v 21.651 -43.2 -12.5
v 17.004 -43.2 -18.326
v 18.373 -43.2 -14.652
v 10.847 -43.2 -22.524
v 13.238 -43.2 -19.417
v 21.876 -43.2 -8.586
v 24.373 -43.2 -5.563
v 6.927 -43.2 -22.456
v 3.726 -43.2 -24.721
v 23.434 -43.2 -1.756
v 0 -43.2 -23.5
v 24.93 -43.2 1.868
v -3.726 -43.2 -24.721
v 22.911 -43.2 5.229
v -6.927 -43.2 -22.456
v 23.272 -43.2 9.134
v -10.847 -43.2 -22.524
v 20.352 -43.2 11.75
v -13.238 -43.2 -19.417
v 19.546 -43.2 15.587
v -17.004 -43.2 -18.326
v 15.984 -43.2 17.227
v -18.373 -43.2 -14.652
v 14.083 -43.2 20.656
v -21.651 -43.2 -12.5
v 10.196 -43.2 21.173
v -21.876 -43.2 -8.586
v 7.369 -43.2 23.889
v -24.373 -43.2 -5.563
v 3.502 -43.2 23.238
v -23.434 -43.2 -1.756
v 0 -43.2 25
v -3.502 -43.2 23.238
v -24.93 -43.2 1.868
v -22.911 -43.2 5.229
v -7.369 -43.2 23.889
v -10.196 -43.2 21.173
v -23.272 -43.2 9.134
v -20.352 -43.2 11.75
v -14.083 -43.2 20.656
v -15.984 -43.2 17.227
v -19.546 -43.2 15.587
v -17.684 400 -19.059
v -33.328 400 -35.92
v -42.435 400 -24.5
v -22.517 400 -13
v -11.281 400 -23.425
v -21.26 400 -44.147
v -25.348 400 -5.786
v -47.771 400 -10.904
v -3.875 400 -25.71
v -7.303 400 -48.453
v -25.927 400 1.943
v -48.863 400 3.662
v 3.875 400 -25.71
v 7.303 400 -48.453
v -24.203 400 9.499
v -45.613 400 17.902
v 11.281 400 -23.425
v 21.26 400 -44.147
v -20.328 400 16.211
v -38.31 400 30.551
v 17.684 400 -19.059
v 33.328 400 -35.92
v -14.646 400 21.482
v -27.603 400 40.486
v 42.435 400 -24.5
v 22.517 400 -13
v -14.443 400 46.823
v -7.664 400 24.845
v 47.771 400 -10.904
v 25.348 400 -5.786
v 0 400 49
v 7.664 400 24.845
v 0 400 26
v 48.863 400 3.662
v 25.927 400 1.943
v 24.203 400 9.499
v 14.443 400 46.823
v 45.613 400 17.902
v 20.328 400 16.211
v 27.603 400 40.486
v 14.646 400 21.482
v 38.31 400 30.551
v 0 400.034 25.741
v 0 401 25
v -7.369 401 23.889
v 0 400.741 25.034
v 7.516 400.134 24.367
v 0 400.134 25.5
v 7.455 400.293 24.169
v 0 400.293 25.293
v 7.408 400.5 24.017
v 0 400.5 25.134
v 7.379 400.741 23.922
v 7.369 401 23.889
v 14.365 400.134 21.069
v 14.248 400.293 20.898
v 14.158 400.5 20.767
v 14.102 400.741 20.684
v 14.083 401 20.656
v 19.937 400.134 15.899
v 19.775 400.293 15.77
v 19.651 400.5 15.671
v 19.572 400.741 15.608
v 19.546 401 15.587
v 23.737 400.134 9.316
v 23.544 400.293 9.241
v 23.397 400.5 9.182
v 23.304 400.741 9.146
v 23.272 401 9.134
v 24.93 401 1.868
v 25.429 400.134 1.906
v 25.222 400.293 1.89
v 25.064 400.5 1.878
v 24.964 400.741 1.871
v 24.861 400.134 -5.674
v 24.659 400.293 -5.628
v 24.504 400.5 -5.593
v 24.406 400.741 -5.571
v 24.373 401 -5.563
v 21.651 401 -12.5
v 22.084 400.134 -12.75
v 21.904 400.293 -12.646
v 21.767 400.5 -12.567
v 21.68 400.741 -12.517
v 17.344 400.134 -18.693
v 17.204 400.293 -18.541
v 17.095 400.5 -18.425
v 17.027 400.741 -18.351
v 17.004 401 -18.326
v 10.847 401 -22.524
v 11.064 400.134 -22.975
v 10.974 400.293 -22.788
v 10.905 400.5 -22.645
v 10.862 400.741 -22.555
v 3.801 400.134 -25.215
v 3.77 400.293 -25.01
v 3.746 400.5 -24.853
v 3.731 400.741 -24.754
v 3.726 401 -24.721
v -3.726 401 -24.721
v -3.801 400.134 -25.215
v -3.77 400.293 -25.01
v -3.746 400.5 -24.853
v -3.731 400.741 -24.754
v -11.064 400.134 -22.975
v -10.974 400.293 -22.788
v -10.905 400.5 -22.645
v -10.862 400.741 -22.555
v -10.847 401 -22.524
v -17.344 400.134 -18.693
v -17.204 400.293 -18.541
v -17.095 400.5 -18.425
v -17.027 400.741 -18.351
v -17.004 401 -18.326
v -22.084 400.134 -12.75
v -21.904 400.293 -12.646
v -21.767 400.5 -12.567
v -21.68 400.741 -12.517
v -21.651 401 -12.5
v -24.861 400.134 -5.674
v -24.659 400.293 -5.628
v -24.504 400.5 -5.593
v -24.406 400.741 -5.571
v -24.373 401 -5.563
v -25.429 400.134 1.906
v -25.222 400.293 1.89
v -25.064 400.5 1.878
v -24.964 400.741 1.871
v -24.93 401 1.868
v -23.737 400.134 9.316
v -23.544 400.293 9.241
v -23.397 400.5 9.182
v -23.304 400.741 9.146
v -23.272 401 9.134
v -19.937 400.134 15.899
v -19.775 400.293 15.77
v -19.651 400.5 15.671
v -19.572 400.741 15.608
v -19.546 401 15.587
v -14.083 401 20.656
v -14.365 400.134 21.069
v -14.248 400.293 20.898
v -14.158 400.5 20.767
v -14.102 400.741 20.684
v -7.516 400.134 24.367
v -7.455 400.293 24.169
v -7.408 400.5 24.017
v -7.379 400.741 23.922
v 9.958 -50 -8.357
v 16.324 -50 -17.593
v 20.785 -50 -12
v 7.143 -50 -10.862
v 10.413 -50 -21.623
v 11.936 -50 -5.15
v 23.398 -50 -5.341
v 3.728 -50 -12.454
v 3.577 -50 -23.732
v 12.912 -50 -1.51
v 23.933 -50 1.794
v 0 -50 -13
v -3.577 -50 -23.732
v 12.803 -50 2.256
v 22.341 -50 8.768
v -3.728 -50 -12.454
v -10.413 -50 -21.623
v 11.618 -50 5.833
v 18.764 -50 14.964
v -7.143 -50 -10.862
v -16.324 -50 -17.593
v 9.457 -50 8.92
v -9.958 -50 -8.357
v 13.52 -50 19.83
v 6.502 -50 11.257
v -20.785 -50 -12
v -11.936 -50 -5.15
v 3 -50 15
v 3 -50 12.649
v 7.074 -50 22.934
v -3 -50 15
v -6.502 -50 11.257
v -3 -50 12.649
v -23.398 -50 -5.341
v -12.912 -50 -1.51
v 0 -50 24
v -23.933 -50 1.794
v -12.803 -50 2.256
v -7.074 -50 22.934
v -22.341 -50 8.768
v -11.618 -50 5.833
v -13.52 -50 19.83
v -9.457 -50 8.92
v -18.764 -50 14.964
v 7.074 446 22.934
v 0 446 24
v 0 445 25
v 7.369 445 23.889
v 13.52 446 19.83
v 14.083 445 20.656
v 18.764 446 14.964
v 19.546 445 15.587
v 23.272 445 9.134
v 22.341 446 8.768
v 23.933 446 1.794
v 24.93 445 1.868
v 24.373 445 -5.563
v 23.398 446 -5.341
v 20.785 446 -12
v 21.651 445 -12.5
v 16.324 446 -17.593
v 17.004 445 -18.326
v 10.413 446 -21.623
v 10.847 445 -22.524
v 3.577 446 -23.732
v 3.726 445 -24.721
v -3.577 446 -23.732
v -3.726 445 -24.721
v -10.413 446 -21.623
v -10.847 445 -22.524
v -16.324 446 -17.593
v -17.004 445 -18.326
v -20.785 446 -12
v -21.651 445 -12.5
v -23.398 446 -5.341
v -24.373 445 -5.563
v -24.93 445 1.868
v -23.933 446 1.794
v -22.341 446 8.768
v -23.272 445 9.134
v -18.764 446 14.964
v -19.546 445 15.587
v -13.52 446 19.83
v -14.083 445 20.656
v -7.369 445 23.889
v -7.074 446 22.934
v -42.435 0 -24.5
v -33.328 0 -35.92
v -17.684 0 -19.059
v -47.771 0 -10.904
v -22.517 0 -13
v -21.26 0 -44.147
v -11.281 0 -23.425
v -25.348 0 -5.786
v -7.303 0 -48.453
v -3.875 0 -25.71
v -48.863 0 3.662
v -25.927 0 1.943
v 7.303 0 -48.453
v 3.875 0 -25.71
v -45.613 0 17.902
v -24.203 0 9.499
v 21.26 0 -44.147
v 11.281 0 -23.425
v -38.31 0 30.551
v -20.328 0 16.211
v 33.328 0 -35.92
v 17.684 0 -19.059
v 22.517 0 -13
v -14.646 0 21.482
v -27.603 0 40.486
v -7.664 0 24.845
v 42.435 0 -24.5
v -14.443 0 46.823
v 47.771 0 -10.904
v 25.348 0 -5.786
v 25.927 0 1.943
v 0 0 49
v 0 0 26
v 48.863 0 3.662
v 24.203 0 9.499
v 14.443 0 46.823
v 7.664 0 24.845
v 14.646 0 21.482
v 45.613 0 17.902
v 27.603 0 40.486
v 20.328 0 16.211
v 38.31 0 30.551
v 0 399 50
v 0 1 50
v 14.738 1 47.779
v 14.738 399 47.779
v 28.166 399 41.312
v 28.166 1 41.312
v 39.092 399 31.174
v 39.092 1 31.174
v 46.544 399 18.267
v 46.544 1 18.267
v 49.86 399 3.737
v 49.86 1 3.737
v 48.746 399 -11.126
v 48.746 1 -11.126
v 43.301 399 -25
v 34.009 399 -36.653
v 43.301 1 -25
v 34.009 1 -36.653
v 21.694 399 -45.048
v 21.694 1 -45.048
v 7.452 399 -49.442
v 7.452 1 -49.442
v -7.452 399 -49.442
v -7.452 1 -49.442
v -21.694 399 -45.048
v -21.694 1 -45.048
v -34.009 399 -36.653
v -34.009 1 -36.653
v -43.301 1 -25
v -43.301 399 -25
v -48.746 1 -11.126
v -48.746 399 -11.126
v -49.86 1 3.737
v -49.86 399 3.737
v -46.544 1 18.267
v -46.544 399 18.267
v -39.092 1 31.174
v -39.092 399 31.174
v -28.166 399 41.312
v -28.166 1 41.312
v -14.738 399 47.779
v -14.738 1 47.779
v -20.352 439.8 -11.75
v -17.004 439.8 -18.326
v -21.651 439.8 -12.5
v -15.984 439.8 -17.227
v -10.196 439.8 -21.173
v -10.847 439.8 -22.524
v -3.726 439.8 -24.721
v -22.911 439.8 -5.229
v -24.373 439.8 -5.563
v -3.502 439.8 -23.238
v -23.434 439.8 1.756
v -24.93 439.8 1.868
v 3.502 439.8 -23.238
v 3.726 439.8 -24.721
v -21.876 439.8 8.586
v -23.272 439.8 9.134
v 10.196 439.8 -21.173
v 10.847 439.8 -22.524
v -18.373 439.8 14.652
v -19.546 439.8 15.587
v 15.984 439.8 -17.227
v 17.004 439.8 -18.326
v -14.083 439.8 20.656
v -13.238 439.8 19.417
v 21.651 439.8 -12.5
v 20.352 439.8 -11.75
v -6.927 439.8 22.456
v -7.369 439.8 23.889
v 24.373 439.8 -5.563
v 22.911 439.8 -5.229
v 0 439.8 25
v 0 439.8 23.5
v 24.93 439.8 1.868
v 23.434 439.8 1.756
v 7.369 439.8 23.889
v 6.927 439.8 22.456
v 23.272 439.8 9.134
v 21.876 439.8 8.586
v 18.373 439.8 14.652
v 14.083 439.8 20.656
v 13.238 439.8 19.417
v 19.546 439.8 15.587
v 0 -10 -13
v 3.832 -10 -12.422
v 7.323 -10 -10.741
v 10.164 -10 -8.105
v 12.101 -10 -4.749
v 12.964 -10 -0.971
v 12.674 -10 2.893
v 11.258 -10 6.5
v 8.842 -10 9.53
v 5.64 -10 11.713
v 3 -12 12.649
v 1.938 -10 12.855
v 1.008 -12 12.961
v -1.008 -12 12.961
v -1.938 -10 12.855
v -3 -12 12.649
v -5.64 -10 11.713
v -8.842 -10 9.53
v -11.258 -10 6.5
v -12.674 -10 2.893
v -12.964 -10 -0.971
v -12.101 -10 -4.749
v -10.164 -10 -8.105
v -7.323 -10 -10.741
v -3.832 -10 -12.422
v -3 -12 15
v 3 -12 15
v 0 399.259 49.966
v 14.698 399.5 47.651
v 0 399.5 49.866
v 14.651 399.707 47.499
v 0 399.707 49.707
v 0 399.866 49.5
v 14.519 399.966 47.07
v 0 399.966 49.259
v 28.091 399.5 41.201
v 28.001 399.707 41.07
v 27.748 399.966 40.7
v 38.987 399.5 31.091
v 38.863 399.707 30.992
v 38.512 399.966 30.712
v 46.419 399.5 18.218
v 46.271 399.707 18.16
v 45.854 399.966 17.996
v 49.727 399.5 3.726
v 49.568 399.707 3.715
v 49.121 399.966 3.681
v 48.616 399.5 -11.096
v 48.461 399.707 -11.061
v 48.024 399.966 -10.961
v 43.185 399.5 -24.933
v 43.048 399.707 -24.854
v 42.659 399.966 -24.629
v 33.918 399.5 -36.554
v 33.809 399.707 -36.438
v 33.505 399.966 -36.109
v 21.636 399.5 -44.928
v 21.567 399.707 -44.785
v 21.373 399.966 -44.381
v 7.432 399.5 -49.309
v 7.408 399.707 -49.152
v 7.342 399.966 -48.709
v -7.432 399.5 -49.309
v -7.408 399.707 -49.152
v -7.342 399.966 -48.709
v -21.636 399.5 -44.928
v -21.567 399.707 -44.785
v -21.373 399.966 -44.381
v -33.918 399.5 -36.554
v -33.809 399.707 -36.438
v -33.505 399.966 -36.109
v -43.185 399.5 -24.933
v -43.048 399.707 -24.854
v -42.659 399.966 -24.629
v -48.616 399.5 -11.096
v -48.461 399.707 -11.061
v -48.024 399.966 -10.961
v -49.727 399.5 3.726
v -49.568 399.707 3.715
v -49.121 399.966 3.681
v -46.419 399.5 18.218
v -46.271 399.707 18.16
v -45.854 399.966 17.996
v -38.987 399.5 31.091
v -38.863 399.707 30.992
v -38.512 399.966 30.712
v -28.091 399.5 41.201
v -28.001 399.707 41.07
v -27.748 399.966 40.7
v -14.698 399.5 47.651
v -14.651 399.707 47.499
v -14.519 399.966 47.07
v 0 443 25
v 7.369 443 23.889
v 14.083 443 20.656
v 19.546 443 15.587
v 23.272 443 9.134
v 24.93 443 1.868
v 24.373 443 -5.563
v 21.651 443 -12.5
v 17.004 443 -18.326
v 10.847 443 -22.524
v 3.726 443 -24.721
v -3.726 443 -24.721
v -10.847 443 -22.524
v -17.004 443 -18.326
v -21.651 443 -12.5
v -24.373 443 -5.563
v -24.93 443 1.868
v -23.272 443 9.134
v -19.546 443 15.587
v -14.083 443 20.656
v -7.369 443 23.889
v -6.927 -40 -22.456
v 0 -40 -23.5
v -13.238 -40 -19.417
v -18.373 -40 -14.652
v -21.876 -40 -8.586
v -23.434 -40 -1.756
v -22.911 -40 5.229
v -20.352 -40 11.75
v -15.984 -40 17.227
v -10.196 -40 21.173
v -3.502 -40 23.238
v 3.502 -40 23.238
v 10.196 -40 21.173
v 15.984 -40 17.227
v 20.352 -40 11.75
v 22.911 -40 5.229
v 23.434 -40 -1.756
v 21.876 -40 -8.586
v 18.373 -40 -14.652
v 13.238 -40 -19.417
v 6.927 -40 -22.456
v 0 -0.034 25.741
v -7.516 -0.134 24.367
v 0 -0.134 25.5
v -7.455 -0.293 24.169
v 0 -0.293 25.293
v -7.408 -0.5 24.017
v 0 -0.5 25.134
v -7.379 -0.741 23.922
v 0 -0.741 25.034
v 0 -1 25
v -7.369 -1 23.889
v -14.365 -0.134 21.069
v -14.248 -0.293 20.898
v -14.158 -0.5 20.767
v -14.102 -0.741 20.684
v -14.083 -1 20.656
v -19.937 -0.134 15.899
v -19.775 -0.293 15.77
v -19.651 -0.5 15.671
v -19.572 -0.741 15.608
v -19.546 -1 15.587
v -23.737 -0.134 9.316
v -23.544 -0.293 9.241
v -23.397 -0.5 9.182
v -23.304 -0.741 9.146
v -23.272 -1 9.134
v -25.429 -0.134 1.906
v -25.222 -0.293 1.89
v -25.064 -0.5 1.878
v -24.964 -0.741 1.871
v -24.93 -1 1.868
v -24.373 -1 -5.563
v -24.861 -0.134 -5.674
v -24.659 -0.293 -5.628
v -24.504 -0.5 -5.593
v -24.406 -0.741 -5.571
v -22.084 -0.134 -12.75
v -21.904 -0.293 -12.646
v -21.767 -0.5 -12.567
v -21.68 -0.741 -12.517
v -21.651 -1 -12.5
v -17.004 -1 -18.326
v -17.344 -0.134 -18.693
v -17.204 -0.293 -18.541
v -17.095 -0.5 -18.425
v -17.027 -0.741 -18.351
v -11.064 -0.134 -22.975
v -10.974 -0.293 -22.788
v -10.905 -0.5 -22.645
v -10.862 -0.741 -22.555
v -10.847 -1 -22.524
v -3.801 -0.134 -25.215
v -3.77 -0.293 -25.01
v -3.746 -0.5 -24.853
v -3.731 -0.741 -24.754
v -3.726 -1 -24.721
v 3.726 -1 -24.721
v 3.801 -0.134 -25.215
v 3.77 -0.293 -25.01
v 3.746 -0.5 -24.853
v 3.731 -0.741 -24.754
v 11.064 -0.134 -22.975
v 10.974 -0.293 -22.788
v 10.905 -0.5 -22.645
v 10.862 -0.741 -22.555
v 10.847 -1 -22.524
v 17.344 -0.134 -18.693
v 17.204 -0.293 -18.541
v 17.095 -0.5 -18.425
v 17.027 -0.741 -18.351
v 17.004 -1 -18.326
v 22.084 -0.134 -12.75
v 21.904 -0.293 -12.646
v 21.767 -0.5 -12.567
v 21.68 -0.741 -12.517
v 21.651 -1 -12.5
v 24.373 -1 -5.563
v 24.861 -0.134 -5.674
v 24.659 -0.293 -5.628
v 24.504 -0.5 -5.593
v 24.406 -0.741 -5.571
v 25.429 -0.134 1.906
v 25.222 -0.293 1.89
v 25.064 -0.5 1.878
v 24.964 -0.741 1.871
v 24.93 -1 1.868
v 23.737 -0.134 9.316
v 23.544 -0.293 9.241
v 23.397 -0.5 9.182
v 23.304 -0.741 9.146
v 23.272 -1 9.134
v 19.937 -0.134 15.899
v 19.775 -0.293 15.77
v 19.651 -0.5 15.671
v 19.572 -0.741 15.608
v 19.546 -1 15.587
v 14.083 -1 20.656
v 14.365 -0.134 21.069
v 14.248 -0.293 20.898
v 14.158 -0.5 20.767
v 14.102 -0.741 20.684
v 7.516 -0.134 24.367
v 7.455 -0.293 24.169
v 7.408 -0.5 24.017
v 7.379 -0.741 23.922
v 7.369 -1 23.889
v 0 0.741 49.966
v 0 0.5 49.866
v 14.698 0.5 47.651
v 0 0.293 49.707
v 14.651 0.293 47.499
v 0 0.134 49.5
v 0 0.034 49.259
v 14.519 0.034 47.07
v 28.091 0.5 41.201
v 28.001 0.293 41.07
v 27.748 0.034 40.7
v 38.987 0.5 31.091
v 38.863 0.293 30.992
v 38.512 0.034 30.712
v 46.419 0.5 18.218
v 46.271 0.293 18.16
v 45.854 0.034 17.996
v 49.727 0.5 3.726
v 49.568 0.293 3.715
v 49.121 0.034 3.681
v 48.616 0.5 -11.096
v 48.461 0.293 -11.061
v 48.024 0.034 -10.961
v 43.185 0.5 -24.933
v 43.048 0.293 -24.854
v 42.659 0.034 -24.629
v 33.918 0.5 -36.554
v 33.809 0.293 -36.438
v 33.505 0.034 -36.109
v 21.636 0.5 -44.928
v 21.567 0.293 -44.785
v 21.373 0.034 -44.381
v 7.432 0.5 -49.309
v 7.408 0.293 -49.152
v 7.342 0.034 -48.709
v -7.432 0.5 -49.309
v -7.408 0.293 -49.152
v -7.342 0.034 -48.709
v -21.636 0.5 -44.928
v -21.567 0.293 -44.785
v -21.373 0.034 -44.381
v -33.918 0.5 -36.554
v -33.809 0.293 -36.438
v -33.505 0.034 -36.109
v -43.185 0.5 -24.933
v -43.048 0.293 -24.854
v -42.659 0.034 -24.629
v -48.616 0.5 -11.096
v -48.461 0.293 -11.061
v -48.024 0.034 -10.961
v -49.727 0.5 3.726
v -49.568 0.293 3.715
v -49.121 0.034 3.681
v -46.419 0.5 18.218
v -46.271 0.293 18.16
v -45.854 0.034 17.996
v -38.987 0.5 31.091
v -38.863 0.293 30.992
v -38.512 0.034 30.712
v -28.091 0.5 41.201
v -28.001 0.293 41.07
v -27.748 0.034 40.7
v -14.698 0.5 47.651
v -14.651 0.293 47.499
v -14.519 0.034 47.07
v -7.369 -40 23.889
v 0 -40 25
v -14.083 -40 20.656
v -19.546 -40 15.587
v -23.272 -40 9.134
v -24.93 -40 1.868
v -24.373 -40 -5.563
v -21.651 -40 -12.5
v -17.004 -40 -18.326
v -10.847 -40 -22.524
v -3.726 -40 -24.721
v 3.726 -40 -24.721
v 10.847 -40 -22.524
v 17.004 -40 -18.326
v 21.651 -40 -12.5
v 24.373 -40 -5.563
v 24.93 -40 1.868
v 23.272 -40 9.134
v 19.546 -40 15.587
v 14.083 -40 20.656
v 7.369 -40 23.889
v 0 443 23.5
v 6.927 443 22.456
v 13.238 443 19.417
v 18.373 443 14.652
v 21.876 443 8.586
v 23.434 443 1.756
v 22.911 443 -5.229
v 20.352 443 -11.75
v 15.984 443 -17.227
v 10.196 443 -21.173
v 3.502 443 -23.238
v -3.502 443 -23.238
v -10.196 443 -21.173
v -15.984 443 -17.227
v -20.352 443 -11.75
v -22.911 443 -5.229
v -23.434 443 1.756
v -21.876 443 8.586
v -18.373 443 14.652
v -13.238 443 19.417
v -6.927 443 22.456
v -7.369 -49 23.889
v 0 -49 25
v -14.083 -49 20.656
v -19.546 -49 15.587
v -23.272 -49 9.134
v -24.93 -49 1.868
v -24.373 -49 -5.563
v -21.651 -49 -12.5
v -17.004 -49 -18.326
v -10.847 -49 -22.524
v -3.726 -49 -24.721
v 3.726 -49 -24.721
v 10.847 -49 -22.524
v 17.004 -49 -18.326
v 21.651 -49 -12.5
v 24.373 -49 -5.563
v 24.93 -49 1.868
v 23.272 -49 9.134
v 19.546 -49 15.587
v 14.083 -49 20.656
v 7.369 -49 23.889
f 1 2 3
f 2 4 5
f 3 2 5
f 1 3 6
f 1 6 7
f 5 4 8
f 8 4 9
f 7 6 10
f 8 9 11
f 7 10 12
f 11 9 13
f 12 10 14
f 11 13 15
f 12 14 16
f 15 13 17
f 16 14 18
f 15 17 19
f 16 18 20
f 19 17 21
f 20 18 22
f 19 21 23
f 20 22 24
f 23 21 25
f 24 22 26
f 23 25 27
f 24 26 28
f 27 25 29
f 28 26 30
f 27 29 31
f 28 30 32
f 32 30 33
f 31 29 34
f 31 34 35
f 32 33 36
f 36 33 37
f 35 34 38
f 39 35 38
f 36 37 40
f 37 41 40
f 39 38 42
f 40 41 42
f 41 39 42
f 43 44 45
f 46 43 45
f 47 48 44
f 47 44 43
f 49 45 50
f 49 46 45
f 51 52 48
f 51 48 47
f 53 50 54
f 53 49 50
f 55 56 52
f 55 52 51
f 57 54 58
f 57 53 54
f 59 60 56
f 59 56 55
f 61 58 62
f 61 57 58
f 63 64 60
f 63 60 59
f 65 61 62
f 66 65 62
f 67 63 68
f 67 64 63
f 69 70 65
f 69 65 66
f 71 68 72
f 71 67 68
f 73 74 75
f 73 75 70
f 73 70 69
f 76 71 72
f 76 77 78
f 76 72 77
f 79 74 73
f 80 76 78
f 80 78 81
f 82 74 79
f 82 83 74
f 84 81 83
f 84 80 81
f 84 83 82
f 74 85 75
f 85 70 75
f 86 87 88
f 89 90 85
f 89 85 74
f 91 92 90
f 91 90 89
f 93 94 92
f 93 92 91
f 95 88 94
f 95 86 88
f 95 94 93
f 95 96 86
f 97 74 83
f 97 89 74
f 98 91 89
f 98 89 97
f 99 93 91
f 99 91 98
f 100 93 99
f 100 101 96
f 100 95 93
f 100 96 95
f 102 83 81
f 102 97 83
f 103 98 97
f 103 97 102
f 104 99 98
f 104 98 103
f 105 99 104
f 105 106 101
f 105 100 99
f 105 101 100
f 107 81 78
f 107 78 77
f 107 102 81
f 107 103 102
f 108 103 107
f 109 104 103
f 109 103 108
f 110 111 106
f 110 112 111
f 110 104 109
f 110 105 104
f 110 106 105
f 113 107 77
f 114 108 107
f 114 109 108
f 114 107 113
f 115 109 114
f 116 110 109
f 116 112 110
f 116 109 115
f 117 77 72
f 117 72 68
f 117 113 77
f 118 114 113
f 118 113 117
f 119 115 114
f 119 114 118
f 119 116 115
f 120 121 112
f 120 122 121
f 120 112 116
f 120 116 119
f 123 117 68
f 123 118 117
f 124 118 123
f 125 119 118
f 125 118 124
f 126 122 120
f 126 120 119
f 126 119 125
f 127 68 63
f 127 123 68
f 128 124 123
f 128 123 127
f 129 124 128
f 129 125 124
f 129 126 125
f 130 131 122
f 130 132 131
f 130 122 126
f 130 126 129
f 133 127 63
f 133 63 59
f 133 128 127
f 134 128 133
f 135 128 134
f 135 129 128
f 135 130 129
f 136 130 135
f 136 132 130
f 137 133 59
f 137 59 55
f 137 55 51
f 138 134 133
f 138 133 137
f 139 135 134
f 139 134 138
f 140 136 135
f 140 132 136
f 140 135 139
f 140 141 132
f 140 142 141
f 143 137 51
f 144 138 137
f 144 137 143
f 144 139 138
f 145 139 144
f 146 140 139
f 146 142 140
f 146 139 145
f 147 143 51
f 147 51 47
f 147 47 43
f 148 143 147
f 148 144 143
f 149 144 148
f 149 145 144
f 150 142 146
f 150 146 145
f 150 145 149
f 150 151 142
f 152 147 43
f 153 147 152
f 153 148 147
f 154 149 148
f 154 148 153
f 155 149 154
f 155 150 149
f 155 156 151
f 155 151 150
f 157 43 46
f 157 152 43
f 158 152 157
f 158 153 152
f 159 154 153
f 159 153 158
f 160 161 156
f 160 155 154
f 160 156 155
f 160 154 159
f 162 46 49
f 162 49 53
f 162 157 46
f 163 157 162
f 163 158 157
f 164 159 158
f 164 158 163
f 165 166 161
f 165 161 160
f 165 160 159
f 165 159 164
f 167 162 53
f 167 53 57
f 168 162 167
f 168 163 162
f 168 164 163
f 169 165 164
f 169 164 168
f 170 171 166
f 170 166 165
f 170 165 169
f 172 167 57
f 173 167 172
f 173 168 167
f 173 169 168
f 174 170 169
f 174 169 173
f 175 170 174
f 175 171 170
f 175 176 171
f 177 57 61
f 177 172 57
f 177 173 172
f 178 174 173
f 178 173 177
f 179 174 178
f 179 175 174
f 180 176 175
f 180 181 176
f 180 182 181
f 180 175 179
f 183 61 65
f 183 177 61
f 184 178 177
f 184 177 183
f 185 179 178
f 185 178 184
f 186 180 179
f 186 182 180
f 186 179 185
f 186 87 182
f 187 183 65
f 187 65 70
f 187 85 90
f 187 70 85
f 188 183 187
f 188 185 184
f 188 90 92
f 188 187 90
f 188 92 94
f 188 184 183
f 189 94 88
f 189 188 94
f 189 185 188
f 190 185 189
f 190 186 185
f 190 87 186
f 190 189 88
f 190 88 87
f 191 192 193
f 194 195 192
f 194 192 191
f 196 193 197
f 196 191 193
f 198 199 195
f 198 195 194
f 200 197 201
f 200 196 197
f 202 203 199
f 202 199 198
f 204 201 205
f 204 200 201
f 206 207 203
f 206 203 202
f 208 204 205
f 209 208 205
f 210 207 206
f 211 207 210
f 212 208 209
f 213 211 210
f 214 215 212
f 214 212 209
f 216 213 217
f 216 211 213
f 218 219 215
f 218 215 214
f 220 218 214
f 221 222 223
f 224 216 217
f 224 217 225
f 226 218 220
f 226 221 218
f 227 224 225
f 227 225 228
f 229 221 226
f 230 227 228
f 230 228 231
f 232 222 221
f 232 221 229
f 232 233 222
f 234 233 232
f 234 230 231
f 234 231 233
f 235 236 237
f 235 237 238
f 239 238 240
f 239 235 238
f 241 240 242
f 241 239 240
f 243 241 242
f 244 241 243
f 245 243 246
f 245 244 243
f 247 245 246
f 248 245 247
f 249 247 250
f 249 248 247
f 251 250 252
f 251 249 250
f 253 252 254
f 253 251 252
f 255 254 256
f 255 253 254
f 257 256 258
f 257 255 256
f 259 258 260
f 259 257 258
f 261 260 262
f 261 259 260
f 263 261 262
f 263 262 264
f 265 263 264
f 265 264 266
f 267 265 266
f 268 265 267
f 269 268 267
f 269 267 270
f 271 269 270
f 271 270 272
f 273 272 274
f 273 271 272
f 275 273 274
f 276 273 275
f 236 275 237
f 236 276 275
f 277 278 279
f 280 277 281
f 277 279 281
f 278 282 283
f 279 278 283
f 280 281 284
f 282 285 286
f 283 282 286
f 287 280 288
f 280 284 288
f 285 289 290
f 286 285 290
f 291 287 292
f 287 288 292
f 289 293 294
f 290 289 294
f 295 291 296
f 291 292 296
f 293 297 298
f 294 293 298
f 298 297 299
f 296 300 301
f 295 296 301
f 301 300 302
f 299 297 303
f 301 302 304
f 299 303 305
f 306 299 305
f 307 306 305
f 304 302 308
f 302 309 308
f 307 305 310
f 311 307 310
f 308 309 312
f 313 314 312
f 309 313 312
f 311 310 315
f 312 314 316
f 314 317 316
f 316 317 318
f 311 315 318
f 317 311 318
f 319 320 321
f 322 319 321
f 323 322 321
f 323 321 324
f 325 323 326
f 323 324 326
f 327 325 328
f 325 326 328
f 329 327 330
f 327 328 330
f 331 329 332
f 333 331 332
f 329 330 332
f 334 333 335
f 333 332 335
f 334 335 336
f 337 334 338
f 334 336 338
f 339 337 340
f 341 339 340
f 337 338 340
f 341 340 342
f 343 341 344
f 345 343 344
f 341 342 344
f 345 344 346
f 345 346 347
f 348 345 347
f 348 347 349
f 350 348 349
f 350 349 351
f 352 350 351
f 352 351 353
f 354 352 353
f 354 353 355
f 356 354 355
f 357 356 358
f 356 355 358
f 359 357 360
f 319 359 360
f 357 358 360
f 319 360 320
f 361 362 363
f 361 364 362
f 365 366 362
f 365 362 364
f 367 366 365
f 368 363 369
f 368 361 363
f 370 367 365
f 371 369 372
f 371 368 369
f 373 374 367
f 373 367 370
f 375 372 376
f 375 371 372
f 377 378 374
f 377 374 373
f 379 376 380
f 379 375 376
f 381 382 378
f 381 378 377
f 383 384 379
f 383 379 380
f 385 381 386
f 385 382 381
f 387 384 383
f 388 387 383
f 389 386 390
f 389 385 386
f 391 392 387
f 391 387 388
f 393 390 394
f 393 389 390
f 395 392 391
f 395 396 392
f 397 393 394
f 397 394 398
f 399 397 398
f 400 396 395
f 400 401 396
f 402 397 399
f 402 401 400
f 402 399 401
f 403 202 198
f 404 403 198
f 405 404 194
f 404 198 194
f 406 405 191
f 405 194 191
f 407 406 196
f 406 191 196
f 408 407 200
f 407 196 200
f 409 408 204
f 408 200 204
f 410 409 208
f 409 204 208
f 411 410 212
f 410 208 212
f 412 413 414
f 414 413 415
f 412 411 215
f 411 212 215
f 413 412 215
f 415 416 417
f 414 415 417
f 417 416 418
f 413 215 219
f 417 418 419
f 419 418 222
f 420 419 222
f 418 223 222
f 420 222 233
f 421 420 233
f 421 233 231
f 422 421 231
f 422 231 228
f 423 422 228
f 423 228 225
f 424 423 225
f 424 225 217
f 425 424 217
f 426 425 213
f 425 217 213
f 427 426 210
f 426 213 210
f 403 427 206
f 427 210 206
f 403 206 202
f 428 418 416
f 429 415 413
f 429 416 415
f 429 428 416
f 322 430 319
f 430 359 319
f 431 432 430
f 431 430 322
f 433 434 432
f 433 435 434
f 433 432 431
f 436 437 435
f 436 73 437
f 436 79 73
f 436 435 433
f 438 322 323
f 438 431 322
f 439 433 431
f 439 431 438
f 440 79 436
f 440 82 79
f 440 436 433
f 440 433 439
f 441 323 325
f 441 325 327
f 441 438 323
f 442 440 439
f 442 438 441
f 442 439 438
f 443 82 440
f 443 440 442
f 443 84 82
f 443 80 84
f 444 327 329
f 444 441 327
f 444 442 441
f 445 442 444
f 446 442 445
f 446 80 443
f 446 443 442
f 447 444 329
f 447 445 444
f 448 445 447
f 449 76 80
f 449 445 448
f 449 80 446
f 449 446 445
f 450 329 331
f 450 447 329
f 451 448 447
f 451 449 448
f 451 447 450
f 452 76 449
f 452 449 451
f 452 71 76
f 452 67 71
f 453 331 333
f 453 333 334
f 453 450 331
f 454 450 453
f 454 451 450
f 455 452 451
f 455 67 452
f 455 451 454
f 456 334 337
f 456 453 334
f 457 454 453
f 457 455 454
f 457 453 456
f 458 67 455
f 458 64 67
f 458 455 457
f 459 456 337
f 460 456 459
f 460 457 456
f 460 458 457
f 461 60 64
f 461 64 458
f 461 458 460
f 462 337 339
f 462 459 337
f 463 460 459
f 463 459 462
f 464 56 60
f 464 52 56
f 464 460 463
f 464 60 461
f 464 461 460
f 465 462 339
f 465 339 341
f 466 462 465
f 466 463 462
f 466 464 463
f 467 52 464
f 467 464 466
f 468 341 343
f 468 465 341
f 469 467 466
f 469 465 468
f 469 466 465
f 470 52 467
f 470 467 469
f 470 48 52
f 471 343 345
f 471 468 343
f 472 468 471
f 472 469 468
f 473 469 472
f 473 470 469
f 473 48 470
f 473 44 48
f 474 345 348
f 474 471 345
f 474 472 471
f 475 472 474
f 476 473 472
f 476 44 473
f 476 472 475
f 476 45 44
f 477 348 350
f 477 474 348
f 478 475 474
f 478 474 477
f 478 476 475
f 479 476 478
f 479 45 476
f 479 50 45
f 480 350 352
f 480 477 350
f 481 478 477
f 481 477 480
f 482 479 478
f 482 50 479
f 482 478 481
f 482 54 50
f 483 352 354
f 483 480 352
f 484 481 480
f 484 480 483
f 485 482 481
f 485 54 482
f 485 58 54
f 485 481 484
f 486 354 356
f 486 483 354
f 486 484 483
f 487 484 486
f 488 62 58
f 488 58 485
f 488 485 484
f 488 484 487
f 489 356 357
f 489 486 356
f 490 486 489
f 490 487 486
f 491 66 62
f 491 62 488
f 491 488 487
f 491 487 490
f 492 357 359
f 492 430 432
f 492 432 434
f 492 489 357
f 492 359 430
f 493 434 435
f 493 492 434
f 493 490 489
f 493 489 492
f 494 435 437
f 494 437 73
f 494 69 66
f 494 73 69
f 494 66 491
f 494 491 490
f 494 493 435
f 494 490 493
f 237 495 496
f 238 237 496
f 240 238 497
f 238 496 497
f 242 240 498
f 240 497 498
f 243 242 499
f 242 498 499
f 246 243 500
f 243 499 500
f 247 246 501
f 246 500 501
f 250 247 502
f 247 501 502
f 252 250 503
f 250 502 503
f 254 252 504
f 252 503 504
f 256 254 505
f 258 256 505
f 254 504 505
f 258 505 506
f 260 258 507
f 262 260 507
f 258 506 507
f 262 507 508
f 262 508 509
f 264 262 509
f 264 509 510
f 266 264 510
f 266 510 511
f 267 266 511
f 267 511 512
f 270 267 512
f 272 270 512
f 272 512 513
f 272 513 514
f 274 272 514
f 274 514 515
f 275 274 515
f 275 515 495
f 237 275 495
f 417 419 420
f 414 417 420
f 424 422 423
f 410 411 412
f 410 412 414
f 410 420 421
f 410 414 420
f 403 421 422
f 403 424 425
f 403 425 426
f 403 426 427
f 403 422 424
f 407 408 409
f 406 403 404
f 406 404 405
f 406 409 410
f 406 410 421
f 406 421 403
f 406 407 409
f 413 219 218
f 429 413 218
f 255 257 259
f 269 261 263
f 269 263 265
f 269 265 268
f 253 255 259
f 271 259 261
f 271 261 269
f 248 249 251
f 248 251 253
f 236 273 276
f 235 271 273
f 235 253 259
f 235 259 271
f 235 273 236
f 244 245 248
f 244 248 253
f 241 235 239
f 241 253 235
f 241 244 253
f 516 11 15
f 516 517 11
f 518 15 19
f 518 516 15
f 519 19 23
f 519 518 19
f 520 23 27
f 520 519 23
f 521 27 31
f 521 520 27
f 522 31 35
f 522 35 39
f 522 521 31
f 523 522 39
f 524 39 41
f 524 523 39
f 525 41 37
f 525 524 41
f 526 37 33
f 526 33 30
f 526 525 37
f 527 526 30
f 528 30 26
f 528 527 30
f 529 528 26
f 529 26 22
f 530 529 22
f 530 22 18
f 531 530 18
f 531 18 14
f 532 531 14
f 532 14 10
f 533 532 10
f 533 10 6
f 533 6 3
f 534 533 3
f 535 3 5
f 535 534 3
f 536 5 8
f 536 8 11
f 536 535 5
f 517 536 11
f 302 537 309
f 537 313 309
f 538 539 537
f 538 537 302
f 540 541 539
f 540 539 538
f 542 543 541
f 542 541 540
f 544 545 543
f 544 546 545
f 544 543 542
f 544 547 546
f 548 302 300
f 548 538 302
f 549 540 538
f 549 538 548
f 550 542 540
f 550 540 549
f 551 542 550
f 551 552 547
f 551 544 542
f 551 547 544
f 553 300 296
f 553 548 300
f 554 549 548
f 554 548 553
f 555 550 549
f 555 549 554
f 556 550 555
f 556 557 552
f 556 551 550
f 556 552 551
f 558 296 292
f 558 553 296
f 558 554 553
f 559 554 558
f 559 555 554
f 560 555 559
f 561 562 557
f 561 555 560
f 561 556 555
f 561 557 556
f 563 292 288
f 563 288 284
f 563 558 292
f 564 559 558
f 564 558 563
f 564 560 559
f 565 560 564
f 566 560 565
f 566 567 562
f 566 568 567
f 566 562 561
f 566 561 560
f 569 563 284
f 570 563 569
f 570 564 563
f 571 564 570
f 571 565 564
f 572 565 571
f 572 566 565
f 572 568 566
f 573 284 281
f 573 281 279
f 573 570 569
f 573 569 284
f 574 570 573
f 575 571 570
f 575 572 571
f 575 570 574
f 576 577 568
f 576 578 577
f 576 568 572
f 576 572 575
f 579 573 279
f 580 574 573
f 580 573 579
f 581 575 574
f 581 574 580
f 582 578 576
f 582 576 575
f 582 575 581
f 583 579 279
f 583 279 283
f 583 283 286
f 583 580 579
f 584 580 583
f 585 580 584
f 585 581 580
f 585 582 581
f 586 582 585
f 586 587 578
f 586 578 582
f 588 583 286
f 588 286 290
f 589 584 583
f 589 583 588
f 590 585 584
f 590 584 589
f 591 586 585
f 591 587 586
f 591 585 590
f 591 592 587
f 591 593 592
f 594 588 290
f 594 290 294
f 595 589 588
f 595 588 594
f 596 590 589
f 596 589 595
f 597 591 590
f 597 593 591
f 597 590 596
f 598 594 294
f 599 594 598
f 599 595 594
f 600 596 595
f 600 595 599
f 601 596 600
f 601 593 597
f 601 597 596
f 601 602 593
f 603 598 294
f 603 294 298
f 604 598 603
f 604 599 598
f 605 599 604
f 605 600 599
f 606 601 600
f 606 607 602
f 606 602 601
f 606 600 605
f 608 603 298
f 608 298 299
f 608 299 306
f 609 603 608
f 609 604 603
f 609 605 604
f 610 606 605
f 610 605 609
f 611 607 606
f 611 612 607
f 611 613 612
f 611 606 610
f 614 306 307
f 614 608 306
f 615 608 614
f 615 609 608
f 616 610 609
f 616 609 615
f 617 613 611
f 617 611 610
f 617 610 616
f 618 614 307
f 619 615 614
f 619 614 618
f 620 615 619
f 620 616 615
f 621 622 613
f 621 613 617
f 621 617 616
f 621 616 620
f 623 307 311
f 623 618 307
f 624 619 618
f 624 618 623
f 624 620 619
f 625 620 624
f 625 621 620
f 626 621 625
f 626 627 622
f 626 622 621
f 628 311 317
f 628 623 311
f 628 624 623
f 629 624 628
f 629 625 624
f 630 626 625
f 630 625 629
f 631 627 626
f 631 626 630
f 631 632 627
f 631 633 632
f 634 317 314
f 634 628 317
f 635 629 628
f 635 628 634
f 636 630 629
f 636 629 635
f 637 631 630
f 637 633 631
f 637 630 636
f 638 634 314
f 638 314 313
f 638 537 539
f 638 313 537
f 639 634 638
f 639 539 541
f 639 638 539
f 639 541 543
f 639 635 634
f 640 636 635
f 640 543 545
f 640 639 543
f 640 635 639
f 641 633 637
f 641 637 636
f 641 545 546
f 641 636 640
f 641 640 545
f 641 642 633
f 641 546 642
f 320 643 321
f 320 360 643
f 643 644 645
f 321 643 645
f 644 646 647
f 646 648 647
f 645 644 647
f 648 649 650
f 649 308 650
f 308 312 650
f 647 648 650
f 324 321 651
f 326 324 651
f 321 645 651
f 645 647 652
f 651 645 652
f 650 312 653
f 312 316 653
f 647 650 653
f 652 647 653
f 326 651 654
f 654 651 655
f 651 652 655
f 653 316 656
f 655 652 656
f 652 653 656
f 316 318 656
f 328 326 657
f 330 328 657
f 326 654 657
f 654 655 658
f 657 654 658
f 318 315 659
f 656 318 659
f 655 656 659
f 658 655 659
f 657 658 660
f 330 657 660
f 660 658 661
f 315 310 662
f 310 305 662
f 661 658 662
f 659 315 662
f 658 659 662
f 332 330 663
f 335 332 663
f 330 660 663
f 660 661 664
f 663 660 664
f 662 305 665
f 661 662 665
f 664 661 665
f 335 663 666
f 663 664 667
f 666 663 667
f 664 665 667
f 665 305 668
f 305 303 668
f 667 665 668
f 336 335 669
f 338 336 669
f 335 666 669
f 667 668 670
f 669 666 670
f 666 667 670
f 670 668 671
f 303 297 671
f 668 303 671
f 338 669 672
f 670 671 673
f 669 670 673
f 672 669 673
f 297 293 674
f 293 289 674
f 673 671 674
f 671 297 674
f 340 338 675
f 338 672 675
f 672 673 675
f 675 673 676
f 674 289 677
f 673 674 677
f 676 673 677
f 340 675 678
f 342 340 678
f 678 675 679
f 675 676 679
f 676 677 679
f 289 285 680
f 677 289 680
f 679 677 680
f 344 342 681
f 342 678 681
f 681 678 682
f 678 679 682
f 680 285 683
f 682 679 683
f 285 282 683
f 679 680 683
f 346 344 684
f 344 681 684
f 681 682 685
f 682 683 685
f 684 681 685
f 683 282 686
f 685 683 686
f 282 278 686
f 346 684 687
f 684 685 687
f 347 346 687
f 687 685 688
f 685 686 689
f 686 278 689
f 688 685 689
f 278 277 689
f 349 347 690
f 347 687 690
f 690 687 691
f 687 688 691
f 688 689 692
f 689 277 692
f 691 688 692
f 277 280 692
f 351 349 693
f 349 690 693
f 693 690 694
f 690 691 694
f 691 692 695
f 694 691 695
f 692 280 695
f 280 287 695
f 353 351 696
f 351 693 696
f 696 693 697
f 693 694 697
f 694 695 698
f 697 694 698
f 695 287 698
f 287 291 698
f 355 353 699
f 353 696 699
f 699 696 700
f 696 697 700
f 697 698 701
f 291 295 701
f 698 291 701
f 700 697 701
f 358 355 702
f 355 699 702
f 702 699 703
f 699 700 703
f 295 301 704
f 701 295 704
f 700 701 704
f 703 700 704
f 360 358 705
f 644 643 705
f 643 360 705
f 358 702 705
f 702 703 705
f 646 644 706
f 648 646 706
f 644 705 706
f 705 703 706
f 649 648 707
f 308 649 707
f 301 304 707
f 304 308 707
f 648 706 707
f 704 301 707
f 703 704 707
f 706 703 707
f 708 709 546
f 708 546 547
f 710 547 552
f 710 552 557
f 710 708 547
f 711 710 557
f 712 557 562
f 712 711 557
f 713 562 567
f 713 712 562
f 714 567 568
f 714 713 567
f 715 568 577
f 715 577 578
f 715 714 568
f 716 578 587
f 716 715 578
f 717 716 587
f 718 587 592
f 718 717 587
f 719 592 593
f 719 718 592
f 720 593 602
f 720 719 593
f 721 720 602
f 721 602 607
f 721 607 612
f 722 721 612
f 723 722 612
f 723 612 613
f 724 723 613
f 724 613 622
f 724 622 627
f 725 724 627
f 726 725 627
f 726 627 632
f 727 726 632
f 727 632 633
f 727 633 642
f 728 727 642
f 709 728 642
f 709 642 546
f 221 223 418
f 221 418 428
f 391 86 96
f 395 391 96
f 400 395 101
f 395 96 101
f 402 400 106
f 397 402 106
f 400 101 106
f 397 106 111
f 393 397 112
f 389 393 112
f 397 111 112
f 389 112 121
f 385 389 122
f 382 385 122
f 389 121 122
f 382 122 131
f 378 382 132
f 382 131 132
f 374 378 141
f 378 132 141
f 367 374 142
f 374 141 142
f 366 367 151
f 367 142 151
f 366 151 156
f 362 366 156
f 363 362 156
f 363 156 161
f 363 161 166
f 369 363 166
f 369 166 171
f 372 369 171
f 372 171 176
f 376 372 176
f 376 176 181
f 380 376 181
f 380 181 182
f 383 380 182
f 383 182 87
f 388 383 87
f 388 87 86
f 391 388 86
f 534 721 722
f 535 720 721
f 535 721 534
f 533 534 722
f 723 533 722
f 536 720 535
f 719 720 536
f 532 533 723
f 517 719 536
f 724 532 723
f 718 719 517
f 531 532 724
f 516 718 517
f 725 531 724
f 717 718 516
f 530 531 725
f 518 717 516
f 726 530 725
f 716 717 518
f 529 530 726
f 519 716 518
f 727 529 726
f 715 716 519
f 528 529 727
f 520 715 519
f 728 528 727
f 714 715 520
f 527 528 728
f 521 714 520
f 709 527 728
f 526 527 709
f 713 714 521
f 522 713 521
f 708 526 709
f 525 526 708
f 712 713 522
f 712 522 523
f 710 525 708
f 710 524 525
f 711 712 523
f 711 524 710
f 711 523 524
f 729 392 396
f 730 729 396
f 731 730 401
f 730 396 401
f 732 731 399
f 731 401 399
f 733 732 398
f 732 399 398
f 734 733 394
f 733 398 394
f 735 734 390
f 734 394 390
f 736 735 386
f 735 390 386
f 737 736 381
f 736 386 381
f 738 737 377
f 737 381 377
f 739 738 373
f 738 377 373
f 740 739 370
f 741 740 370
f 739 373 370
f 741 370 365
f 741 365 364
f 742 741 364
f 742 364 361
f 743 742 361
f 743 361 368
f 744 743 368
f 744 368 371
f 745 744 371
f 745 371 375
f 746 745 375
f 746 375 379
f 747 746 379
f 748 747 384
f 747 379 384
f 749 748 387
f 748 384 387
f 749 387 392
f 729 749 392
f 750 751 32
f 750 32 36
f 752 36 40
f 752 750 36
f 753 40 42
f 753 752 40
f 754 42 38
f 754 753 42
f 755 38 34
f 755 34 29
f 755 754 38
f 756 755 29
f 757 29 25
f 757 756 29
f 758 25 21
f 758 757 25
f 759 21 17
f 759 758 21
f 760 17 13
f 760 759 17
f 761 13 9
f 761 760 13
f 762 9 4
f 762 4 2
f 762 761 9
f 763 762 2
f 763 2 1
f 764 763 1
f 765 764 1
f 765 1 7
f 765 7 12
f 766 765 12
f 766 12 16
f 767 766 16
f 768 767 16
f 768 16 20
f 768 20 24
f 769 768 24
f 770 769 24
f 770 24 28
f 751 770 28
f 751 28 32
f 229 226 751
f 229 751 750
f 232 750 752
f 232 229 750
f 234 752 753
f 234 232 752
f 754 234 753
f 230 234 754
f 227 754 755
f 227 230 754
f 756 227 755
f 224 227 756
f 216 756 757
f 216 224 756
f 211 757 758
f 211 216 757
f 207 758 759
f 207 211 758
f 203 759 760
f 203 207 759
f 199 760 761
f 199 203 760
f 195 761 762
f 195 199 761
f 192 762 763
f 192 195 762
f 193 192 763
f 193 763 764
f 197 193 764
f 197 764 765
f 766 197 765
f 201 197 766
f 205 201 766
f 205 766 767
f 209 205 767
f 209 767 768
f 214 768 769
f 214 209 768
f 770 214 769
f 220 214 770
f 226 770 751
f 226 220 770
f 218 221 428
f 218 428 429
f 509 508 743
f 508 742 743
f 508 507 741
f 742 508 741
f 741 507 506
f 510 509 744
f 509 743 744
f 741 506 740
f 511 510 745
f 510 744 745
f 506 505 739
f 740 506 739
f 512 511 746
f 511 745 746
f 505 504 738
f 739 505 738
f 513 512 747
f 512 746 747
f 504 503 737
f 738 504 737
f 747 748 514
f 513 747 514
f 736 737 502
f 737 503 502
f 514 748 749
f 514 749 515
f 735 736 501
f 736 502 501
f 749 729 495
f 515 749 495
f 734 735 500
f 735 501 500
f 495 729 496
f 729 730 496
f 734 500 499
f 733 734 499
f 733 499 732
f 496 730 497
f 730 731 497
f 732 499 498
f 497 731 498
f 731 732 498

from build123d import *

# Parameters (mm, degrees)
ESQUISSE1_R             = 50
BOSS_EXTRU_1_DEPTH      = 400
ESQUISSE2_R             = 25
BOSS_EXTRU_2_DEPTH      = 46
BOSS_EXTRU_3_START      = 50
ESQUISSE3_R             = 25
BOSS_EXTRU_3_DEPTH      = 50
CONG_1_R                = 1
ENL_V_START             = -6.2
ESQUISSE4_R             = 25
ESQUISSE4_R_2           = 23.5
ENL_V_MAT_EXTRU_1_DEPTH = 3.2
ESQUISSE6_W             = 5.249523393
ESQUISSE6_H             = 3.2
CHANFREIN1_SIZE         = 1
ESQUISSE7_R             = 13
ENL_V_MAT_EXTRU_2_DEPTH = 40
ESQUISSE8_W             = 6
ESQUISSE8_H             = 5
ENL_V_MAT_EXTRU_3_DEPTH = 38


with BuildPart() as part:
    # Esquisse1 → Boss.-Extru.1 (new body)
    with BuildSketch(Plane(origin=(0, 0, 0), x_dir=(1, 0, 0), z_dir=(0, 1, 0))):
        with Locations(Location((0, 0, 0), (0, 0, 270))):
            Circle(ESQUISSE1_R)
    extrude(amount=BOSS_EXTRU_1_DEPTH)

    # Esquisse2 → Boss.-Extru.2 (add)
    with BuildSketch(Plane(origin=(0, 400, 0), x_dir=(1, 0, 0), z_dir=(0, 1, 0))):
        with Locations(Location((0, 0, 0), (0, 0, 270))):
            Circle(ESQUISSE2_R)
    extrude(amount=BOSS_EXTRU_2_DEPTH)

    # Esquisse3 → Boss.-Extru.3 (add)
    with BuildSketch(Plane.XZ.offset(BOSS_EXTRU_3_START)):
        with Locations(Location((0, 0, 0), (0, 0, 90))):
            Circle(ESQUISSE3_R)
    extrude(amount=-BOSS_EXTRU_3_DEPTH)

    # Congé1
    cong_1_edges = [part.edges().sort_by_distance(p)[0] for p in [
        (0, 0, -50),
        (0, 400, -50),
        (0, 400, -25),
        (0, 0, -25),
    ]]
    fillet(cong_1_edges, radius=CONG_1_R)

    # Esquisse4 → Enlèv. mat.-Extru.1 (cut)
    with BuildSketch(Plane(origin=(0, 446, 0), x_dir=(1, 0, 0), z_dir=(0, 1, 0)).offset(ENL_V_START)):
        with Locations(Location((0, 0, 0), (0, 0, 270))):
            Circle(ESQUISSE4_R)
        with Locations(Location((0, 0, 0), (0, 0, 270))):
            Circle(ESQUISSE4_R_2, mode=Mode.SUBTRACT)
    extrude(amount=ENL_V_MAT_EXTRU_1_DEPTH, mode=Mode.SUBTRACT)

    # Esquisse6 → Enlèvement de matière-Révolution1 (revolve, cut)
    with BuildSketch(Plane.XY, mode=Mode.PRIVATE) as enl_vement_de_mati_re_r_volution1_sk:
        with Locations((26.124761697, -41.6)):
            Rectangle(ESQUISSE6_W, ESQUISSE6_H)
    revolve(enl_vement_de_mati_re_r_volution1_sk.sketch.rotate(Axis((0, -50, 0), (0, 1, 0)), 90), axis=Axis((0, -50, 0), (0, 1, 0)), mode=Mode.SUBTRACT)

    # Chanfrein1
    chanfrein1_edges = [part.edges().sort_by_distance(p)[0] for p in [
        (0, -50, -25),
        (0, 446, -25),
    ]]
    chamfer(chanfrein1_edges, length=CHANFREIN1_SIZE)

    # Esquisse7 → Enlèv. mat.-Extru.2 (cut)
    with BuildSketch(Plane.XZ.offset(50)):
        with Locations(Location((0, 0, 0), (0, 0, 270))):
            Circle(ESQUISSE7_R)
    extrude(amount=-ENL_V_MAT_EXTRU_2_DEPTH, mode=Mode.SUBTRACT)

    # Esquisse8 → Enlèv. mat.-Extru.3 (cut)
    with BuildSketch(Plane.XZ.offset(50)):
        with Locations((0, 12.5)):
            Rectangle(ESQUISSE8_W, ESQUISSE8_H)
    extrude(amount=-ENL_V_MAT_EXTRU_3_DEPTH, mode=Mode.SUBTRACT)


solid = part.part
